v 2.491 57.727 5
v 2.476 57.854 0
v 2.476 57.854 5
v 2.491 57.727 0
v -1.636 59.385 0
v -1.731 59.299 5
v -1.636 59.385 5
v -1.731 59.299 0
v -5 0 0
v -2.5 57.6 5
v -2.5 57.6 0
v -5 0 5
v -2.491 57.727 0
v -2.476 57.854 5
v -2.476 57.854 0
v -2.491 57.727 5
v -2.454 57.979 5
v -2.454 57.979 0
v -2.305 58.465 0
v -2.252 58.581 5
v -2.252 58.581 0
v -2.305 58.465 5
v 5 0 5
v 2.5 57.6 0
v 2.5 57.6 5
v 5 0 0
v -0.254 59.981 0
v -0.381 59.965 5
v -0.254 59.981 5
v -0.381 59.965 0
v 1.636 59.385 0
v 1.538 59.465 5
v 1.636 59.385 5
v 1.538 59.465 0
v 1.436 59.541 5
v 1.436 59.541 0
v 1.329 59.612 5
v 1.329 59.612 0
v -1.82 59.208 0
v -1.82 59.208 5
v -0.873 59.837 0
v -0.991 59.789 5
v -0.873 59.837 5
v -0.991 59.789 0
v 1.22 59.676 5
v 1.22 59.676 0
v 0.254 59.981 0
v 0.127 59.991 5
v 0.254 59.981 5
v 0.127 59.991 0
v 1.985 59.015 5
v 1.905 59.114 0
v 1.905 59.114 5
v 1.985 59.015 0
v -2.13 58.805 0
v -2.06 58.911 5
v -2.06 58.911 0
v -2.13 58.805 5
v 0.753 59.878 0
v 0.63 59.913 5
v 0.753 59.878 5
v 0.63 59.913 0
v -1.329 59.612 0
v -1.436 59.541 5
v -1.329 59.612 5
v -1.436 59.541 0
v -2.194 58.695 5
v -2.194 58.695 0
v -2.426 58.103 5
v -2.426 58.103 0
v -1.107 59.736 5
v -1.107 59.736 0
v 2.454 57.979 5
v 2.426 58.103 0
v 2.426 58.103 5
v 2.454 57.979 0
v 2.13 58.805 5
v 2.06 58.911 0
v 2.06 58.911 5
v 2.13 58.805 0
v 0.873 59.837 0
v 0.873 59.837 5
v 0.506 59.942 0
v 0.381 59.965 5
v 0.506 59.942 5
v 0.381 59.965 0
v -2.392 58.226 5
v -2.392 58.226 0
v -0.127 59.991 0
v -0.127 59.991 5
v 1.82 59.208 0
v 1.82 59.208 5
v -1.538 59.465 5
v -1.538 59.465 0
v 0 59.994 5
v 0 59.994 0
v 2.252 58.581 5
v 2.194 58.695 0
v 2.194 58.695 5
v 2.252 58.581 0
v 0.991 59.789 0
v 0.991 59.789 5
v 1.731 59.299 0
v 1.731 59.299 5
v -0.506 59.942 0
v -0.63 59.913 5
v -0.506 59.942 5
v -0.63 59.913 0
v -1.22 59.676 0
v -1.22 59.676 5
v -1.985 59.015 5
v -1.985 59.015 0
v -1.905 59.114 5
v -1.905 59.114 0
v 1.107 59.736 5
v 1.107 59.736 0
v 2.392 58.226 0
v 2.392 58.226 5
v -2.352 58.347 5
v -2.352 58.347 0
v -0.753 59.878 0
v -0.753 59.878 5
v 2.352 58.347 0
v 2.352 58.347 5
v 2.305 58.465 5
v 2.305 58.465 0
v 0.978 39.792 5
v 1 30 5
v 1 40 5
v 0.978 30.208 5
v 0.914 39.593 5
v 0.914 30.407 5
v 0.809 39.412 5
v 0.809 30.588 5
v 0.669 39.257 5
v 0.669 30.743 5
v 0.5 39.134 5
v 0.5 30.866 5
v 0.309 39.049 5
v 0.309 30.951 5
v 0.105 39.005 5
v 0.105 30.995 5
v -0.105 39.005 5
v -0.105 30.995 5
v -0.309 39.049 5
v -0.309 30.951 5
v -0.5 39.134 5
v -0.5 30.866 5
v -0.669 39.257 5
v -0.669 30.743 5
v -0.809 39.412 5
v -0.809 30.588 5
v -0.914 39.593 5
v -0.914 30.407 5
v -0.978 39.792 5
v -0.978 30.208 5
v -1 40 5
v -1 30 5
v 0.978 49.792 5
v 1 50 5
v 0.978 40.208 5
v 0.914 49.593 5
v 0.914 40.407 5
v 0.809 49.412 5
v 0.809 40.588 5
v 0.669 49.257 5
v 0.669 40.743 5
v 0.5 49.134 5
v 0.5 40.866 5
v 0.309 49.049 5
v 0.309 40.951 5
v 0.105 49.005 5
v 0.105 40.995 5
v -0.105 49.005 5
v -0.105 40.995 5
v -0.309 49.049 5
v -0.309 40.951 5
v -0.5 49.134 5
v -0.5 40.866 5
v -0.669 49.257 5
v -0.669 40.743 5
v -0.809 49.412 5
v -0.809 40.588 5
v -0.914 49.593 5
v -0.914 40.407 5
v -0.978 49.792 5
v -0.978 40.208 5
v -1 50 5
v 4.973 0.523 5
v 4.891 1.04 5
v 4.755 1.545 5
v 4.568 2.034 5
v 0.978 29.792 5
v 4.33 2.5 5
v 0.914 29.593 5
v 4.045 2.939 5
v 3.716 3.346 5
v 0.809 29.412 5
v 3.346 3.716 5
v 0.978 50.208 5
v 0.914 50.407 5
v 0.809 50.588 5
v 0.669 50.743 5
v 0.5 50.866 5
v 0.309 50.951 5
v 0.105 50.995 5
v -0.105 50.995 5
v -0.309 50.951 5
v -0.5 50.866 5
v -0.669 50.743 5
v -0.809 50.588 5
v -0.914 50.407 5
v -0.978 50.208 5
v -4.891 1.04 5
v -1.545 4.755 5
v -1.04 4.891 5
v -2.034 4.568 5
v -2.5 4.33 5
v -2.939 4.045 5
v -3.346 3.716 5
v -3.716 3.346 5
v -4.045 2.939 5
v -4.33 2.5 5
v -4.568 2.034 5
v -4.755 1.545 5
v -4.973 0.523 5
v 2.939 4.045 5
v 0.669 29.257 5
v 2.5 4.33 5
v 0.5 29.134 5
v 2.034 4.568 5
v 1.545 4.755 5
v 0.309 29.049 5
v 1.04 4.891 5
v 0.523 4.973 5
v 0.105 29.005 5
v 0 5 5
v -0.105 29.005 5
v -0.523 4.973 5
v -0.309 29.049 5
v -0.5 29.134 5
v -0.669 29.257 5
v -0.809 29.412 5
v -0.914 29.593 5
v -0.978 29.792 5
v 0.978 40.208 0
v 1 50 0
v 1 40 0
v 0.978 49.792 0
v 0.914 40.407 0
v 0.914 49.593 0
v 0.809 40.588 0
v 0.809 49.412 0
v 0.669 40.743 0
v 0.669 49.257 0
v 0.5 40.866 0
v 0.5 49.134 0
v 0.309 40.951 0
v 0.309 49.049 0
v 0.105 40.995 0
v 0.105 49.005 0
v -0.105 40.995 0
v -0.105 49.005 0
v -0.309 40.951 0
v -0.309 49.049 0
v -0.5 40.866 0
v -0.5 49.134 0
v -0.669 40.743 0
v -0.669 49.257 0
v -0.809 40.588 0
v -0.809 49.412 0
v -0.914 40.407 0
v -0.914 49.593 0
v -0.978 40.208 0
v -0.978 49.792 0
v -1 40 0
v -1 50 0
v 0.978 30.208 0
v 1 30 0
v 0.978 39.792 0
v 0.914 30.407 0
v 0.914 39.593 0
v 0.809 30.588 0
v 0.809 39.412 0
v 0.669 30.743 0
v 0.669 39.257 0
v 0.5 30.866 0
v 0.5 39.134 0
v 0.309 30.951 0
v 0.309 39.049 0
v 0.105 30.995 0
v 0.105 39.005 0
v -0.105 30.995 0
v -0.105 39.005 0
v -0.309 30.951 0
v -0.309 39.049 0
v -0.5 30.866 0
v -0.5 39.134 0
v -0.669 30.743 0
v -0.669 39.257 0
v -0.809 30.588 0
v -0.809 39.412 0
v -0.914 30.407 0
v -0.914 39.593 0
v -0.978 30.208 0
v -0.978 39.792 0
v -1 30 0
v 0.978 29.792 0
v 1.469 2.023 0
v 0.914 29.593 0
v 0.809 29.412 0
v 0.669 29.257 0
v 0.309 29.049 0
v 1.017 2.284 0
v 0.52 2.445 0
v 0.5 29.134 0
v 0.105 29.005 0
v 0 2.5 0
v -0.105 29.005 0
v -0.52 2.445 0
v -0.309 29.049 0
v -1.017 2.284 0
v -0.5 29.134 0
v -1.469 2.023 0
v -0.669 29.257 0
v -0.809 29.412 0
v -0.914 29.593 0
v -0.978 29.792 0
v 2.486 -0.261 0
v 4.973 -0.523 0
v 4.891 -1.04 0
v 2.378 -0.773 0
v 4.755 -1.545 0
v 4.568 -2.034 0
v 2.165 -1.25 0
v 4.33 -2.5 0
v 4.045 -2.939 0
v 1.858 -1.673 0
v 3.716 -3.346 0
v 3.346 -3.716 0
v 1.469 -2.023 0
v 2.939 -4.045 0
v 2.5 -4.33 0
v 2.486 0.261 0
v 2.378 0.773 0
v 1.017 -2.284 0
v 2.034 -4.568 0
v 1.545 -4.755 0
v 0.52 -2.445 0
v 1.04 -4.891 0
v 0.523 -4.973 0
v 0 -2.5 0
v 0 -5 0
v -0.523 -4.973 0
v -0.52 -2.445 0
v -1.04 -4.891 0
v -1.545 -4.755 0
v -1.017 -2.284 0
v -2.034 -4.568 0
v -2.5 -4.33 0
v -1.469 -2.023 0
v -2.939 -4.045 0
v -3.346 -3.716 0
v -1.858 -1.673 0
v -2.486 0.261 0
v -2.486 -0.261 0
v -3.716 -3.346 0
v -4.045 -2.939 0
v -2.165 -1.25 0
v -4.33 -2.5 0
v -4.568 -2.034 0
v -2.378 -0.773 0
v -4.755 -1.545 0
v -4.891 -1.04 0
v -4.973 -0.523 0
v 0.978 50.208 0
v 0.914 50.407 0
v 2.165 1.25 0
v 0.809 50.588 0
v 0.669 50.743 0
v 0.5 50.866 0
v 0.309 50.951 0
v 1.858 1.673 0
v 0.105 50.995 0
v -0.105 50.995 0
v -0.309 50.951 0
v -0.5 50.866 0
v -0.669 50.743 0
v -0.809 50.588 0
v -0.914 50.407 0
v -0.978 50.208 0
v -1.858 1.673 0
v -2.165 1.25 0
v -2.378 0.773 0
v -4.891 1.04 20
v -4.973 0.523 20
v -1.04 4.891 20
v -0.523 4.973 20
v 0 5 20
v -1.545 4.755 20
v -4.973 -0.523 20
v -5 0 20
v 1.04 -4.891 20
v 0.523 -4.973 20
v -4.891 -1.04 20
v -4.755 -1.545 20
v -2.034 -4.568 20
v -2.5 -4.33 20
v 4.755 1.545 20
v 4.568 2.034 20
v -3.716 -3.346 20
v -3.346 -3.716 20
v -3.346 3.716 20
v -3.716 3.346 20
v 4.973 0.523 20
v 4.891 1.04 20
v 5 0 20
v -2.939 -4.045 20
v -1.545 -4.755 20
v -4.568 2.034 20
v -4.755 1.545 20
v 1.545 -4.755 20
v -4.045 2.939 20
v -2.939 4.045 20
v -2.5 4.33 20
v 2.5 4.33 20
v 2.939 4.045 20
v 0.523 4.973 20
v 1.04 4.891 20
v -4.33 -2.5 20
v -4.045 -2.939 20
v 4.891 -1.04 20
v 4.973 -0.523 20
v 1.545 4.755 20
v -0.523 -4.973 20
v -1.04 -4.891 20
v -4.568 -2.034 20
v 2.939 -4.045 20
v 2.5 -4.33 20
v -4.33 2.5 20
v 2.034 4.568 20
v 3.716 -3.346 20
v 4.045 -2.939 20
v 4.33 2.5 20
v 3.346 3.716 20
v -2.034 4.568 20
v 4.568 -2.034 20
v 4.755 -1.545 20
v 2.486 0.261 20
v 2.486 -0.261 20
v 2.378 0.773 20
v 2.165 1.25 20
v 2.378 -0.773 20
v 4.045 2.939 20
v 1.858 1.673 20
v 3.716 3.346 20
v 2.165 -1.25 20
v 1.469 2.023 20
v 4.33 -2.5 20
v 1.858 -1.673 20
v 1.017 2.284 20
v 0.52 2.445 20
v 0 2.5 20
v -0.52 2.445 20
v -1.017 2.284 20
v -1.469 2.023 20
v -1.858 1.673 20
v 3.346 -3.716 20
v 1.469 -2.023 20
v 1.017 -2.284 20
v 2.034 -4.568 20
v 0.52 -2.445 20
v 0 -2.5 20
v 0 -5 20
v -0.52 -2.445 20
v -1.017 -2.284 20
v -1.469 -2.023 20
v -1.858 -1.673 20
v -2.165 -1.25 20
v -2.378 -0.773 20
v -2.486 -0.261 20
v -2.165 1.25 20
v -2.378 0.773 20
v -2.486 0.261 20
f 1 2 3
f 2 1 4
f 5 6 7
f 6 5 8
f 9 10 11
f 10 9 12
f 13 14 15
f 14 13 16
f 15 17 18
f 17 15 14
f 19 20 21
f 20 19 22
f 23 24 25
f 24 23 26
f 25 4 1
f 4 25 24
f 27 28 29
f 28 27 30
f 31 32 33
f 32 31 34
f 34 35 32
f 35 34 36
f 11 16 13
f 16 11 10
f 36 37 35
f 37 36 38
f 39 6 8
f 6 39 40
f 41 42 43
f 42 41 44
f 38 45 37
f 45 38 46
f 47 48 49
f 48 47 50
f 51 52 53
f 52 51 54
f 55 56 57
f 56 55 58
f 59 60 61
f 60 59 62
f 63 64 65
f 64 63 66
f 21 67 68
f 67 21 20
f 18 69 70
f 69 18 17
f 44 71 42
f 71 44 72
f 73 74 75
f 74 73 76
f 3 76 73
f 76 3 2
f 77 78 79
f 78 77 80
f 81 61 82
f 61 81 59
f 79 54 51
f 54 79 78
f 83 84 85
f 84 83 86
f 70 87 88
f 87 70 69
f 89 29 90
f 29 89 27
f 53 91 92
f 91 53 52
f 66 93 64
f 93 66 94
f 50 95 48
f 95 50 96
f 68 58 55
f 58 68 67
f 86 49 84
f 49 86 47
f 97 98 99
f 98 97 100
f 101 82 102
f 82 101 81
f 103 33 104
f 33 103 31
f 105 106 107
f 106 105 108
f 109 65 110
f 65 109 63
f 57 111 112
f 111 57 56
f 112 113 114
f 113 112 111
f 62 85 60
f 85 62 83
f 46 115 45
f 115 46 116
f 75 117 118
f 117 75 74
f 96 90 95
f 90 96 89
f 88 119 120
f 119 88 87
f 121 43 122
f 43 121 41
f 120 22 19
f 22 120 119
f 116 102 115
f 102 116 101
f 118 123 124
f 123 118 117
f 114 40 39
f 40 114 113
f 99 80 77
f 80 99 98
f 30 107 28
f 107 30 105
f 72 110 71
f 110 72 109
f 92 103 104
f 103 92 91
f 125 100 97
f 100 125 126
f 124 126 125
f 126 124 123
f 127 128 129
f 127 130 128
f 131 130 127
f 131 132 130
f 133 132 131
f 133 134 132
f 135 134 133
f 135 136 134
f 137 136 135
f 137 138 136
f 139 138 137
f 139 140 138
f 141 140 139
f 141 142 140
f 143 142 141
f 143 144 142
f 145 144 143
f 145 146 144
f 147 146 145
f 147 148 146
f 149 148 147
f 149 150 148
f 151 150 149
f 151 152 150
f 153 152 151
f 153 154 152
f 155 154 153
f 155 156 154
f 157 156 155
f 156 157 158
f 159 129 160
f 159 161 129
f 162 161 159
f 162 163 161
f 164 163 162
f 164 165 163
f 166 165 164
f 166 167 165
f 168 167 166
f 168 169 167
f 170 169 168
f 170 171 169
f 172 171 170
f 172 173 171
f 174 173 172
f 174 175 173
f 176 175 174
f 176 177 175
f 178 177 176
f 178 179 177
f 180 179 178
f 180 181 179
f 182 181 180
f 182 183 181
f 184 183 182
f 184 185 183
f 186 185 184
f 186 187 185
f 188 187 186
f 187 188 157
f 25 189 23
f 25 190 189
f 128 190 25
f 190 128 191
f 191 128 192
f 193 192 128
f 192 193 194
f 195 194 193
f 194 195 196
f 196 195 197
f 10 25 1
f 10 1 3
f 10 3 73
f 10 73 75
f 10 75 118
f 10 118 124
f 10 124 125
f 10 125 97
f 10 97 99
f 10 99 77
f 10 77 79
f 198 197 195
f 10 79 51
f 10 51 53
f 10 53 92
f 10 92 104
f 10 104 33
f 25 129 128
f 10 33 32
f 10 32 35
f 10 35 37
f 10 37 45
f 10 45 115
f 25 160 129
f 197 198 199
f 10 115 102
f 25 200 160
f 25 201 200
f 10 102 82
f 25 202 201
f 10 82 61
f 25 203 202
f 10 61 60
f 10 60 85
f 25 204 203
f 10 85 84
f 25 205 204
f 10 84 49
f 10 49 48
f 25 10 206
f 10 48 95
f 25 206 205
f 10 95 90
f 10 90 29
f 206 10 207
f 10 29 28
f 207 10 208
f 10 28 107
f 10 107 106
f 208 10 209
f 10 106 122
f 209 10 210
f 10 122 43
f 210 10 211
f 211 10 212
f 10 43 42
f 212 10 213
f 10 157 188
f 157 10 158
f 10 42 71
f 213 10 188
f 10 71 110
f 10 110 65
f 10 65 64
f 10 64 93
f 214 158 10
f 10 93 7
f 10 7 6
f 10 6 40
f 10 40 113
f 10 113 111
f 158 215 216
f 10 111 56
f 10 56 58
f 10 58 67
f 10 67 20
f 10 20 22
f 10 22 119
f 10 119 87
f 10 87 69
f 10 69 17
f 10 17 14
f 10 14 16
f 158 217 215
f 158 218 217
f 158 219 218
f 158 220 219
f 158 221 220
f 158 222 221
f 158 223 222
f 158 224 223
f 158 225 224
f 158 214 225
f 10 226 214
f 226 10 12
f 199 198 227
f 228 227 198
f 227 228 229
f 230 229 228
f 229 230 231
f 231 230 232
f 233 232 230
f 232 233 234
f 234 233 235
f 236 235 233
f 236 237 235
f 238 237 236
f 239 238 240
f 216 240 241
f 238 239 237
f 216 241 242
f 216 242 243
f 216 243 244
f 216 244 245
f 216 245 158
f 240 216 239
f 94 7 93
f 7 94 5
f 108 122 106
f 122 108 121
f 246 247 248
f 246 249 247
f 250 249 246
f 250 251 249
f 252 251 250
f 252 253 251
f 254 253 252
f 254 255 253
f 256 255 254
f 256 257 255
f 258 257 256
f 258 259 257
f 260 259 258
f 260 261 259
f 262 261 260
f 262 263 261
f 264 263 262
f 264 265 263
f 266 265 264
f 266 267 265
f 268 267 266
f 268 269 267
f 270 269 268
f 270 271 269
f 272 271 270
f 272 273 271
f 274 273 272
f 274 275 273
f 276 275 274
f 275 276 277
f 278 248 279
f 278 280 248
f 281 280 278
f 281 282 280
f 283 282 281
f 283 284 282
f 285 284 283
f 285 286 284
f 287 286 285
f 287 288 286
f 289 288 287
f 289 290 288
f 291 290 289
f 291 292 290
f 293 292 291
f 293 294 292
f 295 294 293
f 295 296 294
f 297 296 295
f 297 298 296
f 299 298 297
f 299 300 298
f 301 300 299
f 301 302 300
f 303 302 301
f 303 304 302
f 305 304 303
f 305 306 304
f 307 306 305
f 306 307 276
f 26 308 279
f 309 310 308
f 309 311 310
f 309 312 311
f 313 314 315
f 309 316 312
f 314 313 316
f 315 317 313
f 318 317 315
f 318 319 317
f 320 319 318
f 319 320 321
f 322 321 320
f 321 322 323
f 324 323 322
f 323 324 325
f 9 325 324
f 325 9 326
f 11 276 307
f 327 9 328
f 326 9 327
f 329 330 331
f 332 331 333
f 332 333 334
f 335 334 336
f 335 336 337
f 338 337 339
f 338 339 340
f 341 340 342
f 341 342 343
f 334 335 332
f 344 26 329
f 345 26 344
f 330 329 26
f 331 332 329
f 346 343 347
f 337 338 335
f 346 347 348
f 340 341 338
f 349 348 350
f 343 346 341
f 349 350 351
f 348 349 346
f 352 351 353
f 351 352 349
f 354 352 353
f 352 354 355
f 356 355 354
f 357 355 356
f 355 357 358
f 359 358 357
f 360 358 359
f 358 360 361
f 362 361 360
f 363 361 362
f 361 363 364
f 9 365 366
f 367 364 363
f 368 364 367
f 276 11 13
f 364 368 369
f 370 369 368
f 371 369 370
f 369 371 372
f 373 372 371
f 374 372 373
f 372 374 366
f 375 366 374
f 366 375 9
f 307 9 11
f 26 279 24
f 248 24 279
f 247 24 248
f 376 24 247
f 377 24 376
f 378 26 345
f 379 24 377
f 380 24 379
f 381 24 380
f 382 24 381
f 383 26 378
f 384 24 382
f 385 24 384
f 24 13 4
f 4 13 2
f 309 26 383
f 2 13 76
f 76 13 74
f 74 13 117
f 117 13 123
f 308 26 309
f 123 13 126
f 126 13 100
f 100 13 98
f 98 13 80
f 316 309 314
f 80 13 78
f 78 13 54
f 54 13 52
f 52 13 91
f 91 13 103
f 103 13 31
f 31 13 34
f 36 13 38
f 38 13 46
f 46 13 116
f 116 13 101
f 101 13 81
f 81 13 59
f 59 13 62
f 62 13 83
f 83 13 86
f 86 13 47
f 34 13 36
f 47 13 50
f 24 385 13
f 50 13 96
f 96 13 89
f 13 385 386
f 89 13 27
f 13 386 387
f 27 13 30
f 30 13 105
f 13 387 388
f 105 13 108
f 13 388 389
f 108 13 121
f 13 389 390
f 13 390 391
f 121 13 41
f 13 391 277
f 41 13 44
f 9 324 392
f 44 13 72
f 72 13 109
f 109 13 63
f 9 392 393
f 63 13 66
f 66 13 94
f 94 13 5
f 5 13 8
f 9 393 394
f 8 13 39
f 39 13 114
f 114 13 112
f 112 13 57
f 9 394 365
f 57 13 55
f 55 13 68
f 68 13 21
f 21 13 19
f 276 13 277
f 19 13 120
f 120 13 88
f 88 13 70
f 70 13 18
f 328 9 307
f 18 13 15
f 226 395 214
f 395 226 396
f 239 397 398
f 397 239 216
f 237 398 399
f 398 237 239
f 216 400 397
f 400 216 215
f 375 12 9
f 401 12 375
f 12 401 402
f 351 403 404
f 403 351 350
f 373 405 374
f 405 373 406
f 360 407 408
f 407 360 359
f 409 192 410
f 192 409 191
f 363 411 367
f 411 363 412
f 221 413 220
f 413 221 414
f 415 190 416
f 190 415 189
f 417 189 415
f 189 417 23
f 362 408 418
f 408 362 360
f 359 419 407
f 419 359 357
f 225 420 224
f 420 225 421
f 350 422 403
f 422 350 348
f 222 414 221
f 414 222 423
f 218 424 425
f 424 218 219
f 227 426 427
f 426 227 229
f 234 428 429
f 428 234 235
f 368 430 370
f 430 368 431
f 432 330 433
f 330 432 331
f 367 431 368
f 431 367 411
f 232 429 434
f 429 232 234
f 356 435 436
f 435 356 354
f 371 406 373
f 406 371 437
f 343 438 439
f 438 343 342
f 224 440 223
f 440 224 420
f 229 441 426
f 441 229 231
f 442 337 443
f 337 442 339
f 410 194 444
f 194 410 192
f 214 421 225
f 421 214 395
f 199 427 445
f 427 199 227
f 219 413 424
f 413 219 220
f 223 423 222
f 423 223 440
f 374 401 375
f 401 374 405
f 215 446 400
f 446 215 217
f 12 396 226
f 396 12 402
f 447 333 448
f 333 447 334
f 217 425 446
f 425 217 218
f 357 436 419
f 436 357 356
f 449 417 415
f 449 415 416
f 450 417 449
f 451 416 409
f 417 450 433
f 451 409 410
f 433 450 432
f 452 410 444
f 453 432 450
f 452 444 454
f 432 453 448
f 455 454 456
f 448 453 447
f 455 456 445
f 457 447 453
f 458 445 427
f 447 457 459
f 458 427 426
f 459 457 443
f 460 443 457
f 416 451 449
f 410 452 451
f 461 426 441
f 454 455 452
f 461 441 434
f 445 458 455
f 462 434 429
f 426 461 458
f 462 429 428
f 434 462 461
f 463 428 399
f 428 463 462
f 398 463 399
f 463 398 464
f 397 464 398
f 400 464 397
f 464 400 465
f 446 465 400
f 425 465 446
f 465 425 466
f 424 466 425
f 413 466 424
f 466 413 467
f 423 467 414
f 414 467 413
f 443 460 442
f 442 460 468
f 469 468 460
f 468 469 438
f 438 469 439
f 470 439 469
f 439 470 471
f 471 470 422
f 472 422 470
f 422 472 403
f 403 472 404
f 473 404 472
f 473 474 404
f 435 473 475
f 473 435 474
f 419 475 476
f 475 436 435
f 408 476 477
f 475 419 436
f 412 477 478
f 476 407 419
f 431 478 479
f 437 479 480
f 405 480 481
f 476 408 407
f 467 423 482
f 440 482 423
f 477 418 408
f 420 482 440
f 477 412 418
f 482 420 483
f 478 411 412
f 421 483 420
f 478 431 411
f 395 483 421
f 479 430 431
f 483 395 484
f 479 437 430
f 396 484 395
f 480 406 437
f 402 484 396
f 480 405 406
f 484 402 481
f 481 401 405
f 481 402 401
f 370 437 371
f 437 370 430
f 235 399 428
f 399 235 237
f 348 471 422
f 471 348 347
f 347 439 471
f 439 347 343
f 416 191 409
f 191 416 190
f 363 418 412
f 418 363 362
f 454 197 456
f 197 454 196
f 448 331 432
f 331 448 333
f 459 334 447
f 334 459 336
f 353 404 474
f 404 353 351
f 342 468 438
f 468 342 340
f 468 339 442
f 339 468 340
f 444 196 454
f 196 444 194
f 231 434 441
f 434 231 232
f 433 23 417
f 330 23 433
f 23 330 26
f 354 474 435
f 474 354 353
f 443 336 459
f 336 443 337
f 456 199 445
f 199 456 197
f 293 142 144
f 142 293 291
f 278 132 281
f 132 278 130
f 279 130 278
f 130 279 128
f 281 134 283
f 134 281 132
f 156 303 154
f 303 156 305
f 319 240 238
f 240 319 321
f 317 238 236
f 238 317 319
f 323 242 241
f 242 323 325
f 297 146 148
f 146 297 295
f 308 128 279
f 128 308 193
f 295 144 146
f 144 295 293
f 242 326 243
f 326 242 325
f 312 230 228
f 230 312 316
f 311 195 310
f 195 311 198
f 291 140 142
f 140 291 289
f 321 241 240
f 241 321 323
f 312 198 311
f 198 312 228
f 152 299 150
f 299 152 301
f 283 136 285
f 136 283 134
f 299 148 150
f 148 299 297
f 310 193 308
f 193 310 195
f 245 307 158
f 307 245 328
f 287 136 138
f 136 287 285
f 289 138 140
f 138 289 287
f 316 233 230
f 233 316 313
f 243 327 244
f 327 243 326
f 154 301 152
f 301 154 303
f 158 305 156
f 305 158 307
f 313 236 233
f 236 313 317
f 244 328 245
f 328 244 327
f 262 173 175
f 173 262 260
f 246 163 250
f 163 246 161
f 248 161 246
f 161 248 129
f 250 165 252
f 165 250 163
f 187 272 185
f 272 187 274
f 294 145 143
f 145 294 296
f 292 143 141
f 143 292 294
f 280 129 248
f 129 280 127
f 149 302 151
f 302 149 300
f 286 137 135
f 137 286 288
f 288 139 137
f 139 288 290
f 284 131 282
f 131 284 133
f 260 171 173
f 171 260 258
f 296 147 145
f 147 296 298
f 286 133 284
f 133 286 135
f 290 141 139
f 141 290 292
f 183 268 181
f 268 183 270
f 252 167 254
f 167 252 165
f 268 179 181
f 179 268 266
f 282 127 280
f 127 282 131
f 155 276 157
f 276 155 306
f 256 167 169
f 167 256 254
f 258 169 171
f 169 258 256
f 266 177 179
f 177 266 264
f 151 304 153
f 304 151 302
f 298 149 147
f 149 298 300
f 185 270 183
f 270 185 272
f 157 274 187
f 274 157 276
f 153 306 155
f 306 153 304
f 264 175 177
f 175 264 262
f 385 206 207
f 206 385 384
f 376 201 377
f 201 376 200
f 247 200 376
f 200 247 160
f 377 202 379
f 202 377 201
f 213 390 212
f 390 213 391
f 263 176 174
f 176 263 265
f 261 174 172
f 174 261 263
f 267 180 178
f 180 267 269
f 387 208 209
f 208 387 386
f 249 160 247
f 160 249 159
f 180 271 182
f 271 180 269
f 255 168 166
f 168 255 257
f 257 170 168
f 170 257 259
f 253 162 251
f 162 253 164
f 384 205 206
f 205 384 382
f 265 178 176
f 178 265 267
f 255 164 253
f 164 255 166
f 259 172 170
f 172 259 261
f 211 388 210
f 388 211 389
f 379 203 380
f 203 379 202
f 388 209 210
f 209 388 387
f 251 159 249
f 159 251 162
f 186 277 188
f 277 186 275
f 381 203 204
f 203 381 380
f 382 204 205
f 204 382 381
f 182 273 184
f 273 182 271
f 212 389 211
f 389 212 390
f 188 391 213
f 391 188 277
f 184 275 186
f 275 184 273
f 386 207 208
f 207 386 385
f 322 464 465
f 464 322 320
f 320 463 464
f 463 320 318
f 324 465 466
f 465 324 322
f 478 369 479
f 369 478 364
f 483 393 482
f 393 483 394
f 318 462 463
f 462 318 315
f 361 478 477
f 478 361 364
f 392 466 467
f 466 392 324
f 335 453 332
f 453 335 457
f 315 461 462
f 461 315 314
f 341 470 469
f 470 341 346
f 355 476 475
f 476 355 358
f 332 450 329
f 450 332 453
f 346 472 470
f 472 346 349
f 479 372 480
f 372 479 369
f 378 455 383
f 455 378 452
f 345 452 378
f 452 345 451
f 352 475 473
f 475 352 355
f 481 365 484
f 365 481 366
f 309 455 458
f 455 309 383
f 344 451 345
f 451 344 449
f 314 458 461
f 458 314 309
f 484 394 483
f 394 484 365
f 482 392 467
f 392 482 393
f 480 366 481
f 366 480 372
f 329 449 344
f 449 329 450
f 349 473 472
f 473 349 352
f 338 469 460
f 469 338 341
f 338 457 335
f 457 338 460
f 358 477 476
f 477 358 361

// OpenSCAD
module servo_arm(
        Wb, Wt, L, thickness, segments,
        hole_count, hole_diameter, hole_spacing, hole_base_offset,
        base_cyl_diameter, base_cyl_length, base_cyl_hole_diameter)
/* 
Creates a servo arm with through holes and a base connection for a
carbon fiber rod

Wb : base width
Wt : width at start of circular arc
L  : overall lenght 
thickness : Z‑extrusion depth
segments : number of segments in tip arc (Changes shape of tip)

hole_count : number of holes in arm
hole_diameter : diameter of holes in arm
hole_spacing : spacing between holes in arm
hole_base_offset : offset of holes from the base of the arm

base_cyl_diameter : diameter of the connector
base_cyl_length : length of connector (length measured from top surface of the body, negative values inverse connector direction)
base_cyl_hole_diameter : diameter of hole in connector
*/
{
    // find height where arc begins by sampling
    steps = 200;
    candidates = [for(i=[0:steps]) i*L/steps];
    errors = [
        for(h=candidates)
            let(
                dx = abs(Wb-Wt)/2,
                t  = [dx,h]/norm([dx,h]),               // unit tangent
                n  = [ t[1], -t[0] ],                   // outward normal
                P1 = [-Wt/2, h],
                P2 = [ Wt/2, h],
                b  = [P2[0]-P1[0], P2[1]-P1[1]],
                n2 = [-n[0], n[1]],
                det = n[0]*(-n2[1]) - (-n2[0])*n[1],
                s   = det==0 ? 0 :
                      ( b[0]*(-n2[1]) - b[1]*(-n2[0]) )/det,
                C   = [P1[0] + s*n[0], P1[1] + s*n[1]],   // center
                R   = norm([C[0]-P1[0], C[1]-P1[1]]),
                top = C[1] + R                            // arc apex y
            ) abs(top - L)
    ];
    H = candidates[search(min(errors), errors)[0]];

    // recompute circle data with the chosen H
    dx = abs(Wb-Wt)/2;
    t  = [dx,H]/norm([dx,H]);
    n  = [ t[1], -t[0] ];
    P1 = [-Wt/2, H];
    P2 = [ Wt/2, H];
    b  = [P2[0]-P1[0], P2[1]-P1[1]];
    n2 = [-n[0], n[1]];
    det = n[0]*(-n2[1]) - (-n2[0])*n[1];
    s   = det==0 ? 0 :
          ( b[0]*(-n2[1]) - b[1]*(-n2[0]) )/det;
    C   = [P1[0] + s*n[0], P1[1] + s*n[1]];
    R   = norm([C[0]-P1[0], C[1]-P1[1]]);

    // arc point list
    theta1 = atan2(P1[1]-C[1], P1[0]-C[0]);
    theta2 = atan2(P2[1]-C[1], P2[0]-C[0]);
    angles = [for(i=[0:segments]) theta1 + (theta2-theta1)*i/segments];
    arcpts = [for(a=angles) [C[0]+R*cos(a), C[1]+R*sin(a)]];

    // outline polygon
    shape = concat([[-Wb/2,0],[Wb/2,0],P2], arcpts, [P1]);

    // vertical‑hole coordinates
    vholes = [for(i=[0:hole_count-1]) [0, hole_base_offset + i*hole_spacing]];

    // 3‑D construction
    difference() {
        union() {
            // body 
            linear_extrude(height=thickness)
                polygon(points=shape);

            // optional base cylinder 
            if(base_cyl_diameter>0)
                translate([0,0,base_cyl_length/2 + thickness/2])
                    rotate([0,0,90])
                        cylinder(h=abs(base_cyl_length) + thickness,d=       base_cyl_diameter,center=true,$fn=60);
        }

        // vertical holes 
        for(p=vholes)
            translate([p[0],p[1],-1])
                cylinder(h=thickness+2,d=hole_diameter,$fn=30);

        // coaxial hole through connecting cylinder and base 
        if(base_cyl_diameter>0 && base_cyl_hole_diameter>0)
            translate([0,0,base_cyl_length/2 + thickness/2])
                rotate([0,0,90])
                    cylinder(h=abs(base_cyl_length)+thickness+10,
                             d=base_cyl_hole_diameter,
                             center=true,$fn=30);
    }
}

// Render
servo_arm(
    Wb = 10,
    Wt = 5,
    L = 60,
    thickness = 5,
    segments = 60,
    hole_count = 3,
    hole_diameter = 2,
    hole_spacing = 10,
    hole_base_offset = 30,
    base_cyl_diameter = 10,
    base_cyl_length = 15,
    base_cyl_hole_diameter = 5);
